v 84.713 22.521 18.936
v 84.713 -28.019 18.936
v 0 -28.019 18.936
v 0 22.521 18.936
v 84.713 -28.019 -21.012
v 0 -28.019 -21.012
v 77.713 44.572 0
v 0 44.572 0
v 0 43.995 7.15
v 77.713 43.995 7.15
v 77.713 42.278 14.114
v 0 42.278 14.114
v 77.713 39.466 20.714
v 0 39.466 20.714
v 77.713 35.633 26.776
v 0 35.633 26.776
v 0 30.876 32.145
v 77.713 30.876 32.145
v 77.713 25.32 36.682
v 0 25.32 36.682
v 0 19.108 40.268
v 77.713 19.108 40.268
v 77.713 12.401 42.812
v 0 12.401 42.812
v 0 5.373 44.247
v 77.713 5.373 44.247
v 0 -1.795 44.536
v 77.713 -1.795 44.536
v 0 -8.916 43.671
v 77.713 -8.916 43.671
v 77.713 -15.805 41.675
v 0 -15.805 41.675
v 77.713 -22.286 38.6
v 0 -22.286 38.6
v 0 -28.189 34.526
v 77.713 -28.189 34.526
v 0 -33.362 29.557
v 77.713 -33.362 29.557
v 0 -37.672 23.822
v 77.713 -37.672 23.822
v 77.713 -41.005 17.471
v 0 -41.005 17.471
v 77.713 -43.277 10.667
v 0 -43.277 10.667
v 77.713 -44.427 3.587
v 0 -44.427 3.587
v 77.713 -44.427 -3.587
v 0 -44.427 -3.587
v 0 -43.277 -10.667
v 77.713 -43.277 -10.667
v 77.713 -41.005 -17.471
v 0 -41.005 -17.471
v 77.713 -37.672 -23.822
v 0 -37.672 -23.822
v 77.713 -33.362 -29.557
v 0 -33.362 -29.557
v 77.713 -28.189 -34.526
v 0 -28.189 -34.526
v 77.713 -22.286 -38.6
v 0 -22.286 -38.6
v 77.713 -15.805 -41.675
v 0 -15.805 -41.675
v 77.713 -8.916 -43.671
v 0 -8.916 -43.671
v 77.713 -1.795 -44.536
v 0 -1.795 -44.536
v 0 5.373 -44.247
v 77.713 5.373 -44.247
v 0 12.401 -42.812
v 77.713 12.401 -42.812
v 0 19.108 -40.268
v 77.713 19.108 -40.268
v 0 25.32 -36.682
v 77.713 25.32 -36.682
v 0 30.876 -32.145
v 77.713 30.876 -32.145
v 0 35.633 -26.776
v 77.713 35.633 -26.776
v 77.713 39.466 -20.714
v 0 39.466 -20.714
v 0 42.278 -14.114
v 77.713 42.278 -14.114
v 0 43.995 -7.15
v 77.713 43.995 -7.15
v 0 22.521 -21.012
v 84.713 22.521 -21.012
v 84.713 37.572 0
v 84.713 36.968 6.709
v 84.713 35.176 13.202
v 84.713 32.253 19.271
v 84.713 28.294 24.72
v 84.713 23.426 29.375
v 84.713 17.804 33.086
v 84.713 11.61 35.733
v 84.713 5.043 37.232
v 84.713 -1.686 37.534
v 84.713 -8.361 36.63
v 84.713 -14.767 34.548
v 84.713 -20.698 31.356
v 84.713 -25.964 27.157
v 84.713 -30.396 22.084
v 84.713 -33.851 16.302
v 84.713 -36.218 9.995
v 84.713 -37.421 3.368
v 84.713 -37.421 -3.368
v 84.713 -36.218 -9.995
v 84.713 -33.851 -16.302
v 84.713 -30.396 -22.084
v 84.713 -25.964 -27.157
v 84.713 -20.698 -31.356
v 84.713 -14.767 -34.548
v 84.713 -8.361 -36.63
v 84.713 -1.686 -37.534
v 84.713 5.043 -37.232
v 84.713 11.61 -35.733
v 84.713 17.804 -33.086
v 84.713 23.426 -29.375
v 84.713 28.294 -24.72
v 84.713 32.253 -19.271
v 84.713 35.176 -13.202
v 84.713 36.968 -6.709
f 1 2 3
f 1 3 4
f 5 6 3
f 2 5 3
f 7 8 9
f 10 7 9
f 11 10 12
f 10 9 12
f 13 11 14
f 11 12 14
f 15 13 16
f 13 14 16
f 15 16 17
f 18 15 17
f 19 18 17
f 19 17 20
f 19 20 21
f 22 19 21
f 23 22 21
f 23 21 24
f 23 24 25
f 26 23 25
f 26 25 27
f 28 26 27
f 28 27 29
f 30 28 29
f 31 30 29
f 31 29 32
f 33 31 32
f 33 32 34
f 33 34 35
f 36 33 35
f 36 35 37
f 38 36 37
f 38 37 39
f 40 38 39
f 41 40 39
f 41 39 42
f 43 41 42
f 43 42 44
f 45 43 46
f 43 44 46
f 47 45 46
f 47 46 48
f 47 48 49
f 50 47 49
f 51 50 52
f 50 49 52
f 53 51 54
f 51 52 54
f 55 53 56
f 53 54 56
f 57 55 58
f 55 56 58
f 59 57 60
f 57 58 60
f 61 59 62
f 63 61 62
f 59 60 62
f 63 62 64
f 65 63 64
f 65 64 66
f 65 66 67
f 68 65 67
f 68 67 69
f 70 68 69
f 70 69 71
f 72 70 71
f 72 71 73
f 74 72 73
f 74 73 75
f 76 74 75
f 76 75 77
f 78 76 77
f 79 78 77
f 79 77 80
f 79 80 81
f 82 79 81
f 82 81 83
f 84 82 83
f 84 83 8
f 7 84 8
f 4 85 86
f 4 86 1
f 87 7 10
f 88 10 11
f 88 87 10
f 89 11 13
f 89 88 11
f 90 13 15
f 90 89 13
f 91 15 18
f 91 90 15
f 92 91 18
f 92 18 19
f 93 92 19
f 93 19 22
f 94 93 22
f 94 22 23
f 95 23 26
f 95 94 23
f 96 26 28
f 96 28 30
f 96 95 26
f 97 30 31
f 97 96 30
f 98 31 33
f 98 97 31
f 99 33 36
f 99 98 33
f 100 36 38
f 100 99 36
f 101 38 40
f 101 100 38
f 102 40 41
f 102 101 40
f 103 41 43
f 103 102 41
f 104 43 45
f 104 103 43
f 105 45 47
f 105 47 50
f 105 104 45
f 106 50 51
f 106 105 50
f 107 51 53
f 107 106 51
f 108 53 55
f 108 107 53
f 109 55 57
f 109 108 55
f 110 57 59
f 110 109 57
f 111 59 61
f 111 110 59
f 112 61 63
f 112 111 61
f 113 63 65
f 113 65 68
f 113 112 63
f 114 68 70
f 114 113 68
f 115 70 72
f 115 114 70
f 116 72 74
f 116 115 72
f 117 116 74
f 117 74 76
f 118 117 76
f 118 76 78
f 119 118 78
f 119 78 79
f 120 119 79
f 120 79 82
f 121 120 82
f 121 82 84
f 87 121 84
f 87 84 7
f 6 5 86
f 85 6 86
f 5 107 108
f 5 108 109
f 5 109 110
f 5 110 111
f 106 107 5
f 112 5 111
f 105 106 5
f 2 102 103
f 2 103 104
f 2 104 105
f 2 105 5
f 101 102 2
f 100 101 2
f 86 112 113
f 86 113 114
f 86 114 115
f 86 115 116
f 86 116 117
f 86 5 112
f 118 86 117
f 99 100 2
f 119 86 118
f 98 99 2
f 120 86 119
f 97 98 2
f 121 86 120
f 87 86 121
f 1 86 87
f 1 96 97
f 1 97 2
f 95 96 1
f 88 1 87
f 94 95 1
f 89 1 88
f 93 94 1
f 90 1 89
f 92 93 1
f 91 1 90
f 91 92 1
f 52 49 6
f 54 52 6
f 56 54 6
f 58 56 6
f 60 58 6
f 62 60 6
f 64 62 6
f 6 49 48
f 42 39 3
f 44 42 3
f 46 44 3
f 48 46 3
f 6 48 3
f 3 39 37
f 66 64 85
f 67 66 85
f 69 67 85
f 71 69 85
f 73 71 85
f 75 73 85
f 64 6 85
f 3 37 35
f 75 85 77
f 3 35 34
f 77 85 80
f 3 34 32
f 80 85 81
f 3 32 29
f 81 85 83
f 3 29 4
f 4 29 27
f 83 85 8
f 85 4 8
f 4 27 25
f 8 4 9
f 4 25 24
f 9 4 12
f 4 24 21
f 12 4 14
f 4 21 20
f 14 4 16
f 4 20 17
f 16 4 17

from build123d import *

# Parameters (mm, degrees)
F0_R     = 44.5718296496
F1_DEPTH = 59.713
F2_DEPTH = 25
F3_W     = 50.5398474634
F3_H     = 39.9477705359
F4_DEPTH = 128.1019449234
F5_SIZE  = 7


with BuildPart() as f1:
    # F0 (on Right) → F1 (new body)
    with BuildSketch(Plane.YZ):
        Circle(F0_R)
    extrude(amount=F1_DEPTH)

    # F2 (add): a face of the model
    f2_faces = [f1.faces().sort_by_distance(p)[0] for p in [
        (59.713, 0, 0),
    ]]
    extrude(f2_faces, amount=F2_DEPTH)

    # F3 (on face) → F4 (cut)
    with BuildSketch(Plane.YZ.offset(84.713)):
        with Locations((-2.7490835637, -1.037882641)):
            Rectangle(F3_W, F3_H)
    extrude(amount=-F4_DEPTH, mode=Mode.SUBTRACT)

    # F5
    f5_edges = [f1.edges().sort_by_distance(p)[0] for p in [
        (84.713, -44.57183, 0),
    ]]
    chamfer(f5_edges, length=F5_SIZE)


solid = f1.part
